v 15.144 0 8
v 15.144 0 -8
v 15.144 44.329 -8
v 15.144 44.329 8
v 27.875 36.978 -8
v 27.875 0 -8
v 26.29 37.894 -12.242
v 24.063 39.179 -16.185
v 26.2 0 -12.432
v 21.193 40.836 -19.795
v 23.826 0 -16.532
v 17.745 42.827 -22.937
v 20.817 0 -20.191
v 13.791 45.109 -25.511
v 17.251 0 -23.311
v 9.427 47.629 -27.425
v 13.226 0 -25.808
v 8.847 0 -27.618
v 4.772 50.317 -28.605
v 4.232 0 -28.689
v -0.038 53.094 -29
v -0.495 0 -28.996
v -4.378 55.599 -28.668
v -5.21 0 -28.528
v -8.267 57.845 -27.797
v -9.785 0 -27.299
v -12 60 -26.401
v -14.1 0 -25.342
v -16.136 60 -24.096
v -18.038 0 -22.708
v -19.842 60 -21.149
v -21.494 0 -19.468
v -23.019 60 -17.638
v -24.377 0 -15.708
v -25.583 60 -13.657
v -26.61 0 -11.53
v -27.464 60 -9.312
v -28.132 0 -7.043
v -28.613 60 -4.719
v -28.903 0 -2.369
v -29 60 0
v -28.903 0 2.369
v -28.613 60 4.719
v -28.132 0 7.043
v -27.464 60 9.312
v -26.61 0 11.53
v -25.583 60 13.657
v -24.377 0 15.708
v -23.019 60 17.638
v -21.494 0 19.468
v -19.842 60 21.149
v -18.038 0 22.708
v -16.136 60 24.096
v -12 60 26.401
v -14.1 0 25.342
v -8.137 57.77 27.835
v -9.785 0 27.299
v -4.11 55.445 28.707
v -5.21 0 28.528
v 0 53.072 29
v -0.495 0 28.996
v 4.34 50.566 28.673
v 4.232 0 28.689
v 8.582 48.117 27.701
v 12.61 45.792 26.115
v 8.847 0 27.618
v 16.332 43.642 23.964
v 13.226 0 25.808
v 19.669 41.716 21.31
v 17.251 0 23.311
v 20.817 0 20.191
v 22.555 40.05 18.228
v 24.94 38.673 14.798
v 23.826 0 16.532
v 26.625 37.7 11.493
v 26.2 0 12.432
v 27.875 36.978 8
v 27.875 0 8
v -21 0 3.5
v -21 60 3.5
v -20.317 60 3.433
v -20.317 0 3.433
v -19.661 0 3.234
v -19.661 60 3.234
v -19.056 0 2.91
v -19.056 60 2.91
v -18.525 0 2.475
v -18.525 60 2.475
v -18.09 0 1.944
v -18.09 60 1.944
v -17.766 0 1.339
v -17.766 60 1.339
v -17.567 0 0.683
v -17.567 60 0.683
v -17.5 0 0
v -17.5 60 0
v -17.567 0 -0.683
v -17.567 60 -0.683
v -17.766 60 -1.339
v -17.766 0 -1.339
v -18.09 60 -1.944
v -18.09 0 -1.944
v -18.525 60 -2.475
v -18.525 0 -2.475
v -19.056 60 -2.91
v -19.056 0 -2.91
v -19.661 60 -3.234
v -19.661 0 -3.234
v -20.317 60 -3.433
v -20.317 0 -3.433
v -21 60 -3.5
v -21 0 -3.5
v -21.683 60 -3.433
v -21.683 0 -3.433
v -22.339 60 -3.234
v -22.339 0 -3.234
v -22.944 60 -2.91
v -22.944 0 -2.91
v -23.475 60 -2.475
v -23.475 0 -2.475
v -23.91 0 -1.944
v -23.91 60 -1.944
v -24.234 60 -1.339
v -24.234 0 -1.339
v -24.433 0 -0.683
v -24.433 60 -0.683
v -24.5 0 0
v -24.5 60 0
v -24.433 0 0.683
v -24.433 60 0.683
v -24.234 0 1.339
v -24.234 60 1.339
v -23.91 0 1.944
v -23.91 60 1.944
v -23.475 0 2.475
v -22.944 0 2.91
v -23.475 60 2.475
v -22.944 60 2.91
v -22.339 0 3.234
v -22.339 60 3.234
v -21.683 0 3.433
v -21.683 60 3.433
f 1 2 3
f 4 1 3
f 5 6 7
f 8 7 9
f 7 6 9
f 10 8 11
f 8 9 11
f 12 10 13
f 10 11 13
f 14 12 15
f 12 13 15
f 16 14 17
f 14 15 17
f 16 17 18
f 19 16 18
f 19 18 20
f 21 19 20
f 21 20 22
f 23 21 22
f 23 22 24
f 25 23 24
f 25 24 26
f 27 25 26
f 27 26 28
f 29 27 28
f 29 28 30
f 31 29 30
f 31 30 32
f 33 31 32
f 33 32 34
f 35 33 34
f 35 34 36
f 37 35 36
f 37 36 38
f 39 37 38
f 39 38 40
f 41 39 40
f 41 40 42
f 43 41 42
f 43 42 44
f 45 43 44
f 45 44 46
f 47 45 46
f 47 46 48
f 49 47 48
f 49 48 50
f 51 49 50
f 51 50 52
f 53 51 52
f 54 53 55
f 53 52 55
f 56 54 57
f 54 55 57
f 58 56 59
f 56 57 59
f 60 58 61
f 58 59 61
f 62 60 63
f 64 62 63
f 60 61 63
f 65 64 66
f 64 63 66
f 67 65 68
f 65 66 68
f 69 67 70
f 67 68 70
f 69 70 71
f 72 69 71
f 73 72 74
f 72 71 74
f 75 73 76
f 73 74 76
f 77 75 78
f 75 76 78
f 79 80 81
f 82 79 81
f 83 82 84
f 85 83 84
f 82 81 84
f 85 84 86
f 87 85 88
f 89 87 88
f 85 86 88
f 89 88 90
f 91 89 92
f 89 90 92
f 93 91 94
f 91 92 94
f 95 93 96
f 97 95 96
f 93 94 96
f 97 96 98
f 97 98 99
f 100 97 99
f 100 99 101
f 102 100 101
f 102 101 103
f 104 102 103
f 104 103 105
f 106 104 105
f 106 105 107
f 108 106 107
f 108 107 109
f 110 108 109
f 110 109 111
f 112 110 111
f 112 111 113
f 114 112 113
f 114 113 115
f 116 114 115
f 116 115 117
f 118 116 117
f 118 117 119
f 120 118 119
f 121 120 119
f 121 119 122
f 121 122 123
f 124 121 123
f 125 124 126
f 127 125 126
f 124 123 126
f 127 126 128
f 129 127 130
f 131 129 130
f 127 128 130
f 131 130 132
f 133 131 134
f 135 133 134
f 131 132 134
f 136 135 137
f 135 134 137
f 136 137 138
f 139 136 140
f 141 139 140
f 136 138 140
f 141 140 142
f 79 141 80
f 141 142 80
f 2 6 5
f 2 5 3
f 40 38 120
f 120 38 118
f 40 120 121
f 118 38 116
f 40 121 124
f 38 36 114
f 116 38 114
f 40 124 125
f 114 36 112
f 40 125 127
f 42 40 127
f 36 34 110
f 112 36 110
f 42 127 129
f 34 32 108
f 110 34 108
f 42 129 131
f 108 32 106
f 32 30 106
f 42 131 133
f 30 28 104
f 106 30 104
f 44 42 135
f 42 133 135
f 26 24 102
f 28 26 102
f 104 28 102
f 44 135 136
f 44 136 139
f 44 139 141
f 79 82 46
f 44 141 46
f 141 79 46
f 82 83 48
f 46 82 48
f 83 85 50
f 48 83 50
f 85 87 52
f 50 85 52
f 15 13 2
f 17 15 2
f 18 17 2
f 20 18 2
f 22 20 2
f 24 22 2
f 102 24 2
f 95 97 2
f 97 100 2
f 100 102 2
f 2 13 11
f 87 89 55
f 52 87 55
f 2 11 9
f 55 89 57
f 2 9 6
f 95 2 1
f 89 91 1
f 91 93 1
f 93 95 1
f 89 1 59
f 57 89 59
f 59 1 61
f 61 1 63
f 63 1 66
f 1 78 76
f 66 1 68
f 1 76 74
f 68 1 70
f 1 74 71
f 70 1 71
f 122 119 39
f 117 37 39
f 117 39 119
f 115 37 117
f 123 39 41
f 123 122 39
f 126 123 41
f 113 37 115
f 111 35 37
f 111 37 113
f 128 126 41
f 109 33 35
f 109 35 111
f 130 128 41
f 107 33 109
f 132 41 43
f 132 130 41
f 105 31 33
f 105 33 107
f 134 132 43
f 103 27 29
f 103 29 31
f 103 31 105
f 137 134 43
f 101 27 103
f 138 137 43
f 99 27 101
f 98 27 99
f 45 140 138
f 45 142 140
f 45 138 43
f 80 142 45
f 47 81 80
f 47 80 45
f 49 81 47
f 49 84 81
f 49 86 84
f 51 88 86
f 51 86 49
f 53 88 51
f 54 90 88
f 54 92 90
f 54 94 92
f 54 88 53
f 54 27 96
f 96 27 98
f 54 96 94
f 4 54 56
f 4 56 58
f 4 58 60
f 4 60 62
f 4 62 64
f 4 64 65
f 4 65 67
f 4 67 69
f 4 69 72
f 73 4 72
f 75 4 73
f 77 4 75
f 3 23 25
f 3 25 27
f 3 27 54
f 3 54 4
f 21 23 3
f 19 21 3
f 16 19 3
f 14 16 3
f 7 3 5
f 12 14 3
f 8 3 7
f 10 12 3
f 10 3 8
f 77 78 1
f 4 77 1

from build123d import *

# Parameters (mm, degrees)
SKETCH1_R               = 29
BOSS_EXTRUDE1_DEPTH     = 60
CUT_EXTRUDE1_DEPTH      = 73.677369242
CUT_EXTRUDE1_DEPTH_BACK = 73.677369242
CUT_EXTRUDE3_DEPTH      = 8
CUT_EXTRUDE3_DEPTH_BACK = 8
CUT_EXTRUDE4_REACH      = 74.677
SKETCH7_R               = 3.5


with BuildPart() as part:
    # Sketch1 → Boss-Extrude1 (new body)
    with BuildSketch(Plane(origin=(0, 0, 0), x_dir=(1, 0, 0), z_dir=(0, 1, 0))):
        Circle(SKETCH1_R)
    extrude(amount=BOSS_EXTRUDE1_DEPTH)

    # Sketch2 → Cut-Extrude1 (cut, two sides: drawn at the far end of the back side and taken through both)
    with BuildSketch(Plane.XY.offset(-CUT_EXTRUDE1_DEPTH_BACK)):
        Polygon((-12, 60), (29, 36.328638963), (29, 60), align=None)
    extrude(amount=CUT_EXTRUDE1_DEPTH + CUT_EXTRUDE1_DEPTH_BACK, mode=Mode.SUBTRACT)

    # Sketch6 → Cut-Extrude3 (cut, two sides: drawn at the far end of the back side and taken through both)
    with BuildSketch(Plane.XY.offset(-CUT_EXTRUDE3_DEPTH_BACK)):
        Polygon((15.143593539, 44.328638963), (29, 36.328638963), (29, 0), (15.143593539, 0), align=None)
    extrude(amount=CUT_EXTRUDE3_DEPTH + CUT_EXTRUDE3_DEPTH_BACK, mode=Mode.SUBTRACT)

    # Sketch7 → Cut-Extrude4 (cut, up to next)
    with BuildSketch(Plane(origin=(0, 60, 0), x_dir=(1, 0, 0), z_dir=(0, 1, 0)), mode=Mode.PRIVATE) as cut_extrude4_sk1:
        with Locations((-21, 0)):
            Circle(SKETCH7_R)
    cut_extrude4_tool1 = extrude(cut_extrude4_sk1.sketch, amount=-CUT_EXTRUDE4_REACH, mode=Mode.PRIVATE) & part.part
    add(cut_extrude4_tool1.solids().sort_by_distance((-21, 60, 0))[0], mode=Mode.SUBTRACT)


solid = part.part
